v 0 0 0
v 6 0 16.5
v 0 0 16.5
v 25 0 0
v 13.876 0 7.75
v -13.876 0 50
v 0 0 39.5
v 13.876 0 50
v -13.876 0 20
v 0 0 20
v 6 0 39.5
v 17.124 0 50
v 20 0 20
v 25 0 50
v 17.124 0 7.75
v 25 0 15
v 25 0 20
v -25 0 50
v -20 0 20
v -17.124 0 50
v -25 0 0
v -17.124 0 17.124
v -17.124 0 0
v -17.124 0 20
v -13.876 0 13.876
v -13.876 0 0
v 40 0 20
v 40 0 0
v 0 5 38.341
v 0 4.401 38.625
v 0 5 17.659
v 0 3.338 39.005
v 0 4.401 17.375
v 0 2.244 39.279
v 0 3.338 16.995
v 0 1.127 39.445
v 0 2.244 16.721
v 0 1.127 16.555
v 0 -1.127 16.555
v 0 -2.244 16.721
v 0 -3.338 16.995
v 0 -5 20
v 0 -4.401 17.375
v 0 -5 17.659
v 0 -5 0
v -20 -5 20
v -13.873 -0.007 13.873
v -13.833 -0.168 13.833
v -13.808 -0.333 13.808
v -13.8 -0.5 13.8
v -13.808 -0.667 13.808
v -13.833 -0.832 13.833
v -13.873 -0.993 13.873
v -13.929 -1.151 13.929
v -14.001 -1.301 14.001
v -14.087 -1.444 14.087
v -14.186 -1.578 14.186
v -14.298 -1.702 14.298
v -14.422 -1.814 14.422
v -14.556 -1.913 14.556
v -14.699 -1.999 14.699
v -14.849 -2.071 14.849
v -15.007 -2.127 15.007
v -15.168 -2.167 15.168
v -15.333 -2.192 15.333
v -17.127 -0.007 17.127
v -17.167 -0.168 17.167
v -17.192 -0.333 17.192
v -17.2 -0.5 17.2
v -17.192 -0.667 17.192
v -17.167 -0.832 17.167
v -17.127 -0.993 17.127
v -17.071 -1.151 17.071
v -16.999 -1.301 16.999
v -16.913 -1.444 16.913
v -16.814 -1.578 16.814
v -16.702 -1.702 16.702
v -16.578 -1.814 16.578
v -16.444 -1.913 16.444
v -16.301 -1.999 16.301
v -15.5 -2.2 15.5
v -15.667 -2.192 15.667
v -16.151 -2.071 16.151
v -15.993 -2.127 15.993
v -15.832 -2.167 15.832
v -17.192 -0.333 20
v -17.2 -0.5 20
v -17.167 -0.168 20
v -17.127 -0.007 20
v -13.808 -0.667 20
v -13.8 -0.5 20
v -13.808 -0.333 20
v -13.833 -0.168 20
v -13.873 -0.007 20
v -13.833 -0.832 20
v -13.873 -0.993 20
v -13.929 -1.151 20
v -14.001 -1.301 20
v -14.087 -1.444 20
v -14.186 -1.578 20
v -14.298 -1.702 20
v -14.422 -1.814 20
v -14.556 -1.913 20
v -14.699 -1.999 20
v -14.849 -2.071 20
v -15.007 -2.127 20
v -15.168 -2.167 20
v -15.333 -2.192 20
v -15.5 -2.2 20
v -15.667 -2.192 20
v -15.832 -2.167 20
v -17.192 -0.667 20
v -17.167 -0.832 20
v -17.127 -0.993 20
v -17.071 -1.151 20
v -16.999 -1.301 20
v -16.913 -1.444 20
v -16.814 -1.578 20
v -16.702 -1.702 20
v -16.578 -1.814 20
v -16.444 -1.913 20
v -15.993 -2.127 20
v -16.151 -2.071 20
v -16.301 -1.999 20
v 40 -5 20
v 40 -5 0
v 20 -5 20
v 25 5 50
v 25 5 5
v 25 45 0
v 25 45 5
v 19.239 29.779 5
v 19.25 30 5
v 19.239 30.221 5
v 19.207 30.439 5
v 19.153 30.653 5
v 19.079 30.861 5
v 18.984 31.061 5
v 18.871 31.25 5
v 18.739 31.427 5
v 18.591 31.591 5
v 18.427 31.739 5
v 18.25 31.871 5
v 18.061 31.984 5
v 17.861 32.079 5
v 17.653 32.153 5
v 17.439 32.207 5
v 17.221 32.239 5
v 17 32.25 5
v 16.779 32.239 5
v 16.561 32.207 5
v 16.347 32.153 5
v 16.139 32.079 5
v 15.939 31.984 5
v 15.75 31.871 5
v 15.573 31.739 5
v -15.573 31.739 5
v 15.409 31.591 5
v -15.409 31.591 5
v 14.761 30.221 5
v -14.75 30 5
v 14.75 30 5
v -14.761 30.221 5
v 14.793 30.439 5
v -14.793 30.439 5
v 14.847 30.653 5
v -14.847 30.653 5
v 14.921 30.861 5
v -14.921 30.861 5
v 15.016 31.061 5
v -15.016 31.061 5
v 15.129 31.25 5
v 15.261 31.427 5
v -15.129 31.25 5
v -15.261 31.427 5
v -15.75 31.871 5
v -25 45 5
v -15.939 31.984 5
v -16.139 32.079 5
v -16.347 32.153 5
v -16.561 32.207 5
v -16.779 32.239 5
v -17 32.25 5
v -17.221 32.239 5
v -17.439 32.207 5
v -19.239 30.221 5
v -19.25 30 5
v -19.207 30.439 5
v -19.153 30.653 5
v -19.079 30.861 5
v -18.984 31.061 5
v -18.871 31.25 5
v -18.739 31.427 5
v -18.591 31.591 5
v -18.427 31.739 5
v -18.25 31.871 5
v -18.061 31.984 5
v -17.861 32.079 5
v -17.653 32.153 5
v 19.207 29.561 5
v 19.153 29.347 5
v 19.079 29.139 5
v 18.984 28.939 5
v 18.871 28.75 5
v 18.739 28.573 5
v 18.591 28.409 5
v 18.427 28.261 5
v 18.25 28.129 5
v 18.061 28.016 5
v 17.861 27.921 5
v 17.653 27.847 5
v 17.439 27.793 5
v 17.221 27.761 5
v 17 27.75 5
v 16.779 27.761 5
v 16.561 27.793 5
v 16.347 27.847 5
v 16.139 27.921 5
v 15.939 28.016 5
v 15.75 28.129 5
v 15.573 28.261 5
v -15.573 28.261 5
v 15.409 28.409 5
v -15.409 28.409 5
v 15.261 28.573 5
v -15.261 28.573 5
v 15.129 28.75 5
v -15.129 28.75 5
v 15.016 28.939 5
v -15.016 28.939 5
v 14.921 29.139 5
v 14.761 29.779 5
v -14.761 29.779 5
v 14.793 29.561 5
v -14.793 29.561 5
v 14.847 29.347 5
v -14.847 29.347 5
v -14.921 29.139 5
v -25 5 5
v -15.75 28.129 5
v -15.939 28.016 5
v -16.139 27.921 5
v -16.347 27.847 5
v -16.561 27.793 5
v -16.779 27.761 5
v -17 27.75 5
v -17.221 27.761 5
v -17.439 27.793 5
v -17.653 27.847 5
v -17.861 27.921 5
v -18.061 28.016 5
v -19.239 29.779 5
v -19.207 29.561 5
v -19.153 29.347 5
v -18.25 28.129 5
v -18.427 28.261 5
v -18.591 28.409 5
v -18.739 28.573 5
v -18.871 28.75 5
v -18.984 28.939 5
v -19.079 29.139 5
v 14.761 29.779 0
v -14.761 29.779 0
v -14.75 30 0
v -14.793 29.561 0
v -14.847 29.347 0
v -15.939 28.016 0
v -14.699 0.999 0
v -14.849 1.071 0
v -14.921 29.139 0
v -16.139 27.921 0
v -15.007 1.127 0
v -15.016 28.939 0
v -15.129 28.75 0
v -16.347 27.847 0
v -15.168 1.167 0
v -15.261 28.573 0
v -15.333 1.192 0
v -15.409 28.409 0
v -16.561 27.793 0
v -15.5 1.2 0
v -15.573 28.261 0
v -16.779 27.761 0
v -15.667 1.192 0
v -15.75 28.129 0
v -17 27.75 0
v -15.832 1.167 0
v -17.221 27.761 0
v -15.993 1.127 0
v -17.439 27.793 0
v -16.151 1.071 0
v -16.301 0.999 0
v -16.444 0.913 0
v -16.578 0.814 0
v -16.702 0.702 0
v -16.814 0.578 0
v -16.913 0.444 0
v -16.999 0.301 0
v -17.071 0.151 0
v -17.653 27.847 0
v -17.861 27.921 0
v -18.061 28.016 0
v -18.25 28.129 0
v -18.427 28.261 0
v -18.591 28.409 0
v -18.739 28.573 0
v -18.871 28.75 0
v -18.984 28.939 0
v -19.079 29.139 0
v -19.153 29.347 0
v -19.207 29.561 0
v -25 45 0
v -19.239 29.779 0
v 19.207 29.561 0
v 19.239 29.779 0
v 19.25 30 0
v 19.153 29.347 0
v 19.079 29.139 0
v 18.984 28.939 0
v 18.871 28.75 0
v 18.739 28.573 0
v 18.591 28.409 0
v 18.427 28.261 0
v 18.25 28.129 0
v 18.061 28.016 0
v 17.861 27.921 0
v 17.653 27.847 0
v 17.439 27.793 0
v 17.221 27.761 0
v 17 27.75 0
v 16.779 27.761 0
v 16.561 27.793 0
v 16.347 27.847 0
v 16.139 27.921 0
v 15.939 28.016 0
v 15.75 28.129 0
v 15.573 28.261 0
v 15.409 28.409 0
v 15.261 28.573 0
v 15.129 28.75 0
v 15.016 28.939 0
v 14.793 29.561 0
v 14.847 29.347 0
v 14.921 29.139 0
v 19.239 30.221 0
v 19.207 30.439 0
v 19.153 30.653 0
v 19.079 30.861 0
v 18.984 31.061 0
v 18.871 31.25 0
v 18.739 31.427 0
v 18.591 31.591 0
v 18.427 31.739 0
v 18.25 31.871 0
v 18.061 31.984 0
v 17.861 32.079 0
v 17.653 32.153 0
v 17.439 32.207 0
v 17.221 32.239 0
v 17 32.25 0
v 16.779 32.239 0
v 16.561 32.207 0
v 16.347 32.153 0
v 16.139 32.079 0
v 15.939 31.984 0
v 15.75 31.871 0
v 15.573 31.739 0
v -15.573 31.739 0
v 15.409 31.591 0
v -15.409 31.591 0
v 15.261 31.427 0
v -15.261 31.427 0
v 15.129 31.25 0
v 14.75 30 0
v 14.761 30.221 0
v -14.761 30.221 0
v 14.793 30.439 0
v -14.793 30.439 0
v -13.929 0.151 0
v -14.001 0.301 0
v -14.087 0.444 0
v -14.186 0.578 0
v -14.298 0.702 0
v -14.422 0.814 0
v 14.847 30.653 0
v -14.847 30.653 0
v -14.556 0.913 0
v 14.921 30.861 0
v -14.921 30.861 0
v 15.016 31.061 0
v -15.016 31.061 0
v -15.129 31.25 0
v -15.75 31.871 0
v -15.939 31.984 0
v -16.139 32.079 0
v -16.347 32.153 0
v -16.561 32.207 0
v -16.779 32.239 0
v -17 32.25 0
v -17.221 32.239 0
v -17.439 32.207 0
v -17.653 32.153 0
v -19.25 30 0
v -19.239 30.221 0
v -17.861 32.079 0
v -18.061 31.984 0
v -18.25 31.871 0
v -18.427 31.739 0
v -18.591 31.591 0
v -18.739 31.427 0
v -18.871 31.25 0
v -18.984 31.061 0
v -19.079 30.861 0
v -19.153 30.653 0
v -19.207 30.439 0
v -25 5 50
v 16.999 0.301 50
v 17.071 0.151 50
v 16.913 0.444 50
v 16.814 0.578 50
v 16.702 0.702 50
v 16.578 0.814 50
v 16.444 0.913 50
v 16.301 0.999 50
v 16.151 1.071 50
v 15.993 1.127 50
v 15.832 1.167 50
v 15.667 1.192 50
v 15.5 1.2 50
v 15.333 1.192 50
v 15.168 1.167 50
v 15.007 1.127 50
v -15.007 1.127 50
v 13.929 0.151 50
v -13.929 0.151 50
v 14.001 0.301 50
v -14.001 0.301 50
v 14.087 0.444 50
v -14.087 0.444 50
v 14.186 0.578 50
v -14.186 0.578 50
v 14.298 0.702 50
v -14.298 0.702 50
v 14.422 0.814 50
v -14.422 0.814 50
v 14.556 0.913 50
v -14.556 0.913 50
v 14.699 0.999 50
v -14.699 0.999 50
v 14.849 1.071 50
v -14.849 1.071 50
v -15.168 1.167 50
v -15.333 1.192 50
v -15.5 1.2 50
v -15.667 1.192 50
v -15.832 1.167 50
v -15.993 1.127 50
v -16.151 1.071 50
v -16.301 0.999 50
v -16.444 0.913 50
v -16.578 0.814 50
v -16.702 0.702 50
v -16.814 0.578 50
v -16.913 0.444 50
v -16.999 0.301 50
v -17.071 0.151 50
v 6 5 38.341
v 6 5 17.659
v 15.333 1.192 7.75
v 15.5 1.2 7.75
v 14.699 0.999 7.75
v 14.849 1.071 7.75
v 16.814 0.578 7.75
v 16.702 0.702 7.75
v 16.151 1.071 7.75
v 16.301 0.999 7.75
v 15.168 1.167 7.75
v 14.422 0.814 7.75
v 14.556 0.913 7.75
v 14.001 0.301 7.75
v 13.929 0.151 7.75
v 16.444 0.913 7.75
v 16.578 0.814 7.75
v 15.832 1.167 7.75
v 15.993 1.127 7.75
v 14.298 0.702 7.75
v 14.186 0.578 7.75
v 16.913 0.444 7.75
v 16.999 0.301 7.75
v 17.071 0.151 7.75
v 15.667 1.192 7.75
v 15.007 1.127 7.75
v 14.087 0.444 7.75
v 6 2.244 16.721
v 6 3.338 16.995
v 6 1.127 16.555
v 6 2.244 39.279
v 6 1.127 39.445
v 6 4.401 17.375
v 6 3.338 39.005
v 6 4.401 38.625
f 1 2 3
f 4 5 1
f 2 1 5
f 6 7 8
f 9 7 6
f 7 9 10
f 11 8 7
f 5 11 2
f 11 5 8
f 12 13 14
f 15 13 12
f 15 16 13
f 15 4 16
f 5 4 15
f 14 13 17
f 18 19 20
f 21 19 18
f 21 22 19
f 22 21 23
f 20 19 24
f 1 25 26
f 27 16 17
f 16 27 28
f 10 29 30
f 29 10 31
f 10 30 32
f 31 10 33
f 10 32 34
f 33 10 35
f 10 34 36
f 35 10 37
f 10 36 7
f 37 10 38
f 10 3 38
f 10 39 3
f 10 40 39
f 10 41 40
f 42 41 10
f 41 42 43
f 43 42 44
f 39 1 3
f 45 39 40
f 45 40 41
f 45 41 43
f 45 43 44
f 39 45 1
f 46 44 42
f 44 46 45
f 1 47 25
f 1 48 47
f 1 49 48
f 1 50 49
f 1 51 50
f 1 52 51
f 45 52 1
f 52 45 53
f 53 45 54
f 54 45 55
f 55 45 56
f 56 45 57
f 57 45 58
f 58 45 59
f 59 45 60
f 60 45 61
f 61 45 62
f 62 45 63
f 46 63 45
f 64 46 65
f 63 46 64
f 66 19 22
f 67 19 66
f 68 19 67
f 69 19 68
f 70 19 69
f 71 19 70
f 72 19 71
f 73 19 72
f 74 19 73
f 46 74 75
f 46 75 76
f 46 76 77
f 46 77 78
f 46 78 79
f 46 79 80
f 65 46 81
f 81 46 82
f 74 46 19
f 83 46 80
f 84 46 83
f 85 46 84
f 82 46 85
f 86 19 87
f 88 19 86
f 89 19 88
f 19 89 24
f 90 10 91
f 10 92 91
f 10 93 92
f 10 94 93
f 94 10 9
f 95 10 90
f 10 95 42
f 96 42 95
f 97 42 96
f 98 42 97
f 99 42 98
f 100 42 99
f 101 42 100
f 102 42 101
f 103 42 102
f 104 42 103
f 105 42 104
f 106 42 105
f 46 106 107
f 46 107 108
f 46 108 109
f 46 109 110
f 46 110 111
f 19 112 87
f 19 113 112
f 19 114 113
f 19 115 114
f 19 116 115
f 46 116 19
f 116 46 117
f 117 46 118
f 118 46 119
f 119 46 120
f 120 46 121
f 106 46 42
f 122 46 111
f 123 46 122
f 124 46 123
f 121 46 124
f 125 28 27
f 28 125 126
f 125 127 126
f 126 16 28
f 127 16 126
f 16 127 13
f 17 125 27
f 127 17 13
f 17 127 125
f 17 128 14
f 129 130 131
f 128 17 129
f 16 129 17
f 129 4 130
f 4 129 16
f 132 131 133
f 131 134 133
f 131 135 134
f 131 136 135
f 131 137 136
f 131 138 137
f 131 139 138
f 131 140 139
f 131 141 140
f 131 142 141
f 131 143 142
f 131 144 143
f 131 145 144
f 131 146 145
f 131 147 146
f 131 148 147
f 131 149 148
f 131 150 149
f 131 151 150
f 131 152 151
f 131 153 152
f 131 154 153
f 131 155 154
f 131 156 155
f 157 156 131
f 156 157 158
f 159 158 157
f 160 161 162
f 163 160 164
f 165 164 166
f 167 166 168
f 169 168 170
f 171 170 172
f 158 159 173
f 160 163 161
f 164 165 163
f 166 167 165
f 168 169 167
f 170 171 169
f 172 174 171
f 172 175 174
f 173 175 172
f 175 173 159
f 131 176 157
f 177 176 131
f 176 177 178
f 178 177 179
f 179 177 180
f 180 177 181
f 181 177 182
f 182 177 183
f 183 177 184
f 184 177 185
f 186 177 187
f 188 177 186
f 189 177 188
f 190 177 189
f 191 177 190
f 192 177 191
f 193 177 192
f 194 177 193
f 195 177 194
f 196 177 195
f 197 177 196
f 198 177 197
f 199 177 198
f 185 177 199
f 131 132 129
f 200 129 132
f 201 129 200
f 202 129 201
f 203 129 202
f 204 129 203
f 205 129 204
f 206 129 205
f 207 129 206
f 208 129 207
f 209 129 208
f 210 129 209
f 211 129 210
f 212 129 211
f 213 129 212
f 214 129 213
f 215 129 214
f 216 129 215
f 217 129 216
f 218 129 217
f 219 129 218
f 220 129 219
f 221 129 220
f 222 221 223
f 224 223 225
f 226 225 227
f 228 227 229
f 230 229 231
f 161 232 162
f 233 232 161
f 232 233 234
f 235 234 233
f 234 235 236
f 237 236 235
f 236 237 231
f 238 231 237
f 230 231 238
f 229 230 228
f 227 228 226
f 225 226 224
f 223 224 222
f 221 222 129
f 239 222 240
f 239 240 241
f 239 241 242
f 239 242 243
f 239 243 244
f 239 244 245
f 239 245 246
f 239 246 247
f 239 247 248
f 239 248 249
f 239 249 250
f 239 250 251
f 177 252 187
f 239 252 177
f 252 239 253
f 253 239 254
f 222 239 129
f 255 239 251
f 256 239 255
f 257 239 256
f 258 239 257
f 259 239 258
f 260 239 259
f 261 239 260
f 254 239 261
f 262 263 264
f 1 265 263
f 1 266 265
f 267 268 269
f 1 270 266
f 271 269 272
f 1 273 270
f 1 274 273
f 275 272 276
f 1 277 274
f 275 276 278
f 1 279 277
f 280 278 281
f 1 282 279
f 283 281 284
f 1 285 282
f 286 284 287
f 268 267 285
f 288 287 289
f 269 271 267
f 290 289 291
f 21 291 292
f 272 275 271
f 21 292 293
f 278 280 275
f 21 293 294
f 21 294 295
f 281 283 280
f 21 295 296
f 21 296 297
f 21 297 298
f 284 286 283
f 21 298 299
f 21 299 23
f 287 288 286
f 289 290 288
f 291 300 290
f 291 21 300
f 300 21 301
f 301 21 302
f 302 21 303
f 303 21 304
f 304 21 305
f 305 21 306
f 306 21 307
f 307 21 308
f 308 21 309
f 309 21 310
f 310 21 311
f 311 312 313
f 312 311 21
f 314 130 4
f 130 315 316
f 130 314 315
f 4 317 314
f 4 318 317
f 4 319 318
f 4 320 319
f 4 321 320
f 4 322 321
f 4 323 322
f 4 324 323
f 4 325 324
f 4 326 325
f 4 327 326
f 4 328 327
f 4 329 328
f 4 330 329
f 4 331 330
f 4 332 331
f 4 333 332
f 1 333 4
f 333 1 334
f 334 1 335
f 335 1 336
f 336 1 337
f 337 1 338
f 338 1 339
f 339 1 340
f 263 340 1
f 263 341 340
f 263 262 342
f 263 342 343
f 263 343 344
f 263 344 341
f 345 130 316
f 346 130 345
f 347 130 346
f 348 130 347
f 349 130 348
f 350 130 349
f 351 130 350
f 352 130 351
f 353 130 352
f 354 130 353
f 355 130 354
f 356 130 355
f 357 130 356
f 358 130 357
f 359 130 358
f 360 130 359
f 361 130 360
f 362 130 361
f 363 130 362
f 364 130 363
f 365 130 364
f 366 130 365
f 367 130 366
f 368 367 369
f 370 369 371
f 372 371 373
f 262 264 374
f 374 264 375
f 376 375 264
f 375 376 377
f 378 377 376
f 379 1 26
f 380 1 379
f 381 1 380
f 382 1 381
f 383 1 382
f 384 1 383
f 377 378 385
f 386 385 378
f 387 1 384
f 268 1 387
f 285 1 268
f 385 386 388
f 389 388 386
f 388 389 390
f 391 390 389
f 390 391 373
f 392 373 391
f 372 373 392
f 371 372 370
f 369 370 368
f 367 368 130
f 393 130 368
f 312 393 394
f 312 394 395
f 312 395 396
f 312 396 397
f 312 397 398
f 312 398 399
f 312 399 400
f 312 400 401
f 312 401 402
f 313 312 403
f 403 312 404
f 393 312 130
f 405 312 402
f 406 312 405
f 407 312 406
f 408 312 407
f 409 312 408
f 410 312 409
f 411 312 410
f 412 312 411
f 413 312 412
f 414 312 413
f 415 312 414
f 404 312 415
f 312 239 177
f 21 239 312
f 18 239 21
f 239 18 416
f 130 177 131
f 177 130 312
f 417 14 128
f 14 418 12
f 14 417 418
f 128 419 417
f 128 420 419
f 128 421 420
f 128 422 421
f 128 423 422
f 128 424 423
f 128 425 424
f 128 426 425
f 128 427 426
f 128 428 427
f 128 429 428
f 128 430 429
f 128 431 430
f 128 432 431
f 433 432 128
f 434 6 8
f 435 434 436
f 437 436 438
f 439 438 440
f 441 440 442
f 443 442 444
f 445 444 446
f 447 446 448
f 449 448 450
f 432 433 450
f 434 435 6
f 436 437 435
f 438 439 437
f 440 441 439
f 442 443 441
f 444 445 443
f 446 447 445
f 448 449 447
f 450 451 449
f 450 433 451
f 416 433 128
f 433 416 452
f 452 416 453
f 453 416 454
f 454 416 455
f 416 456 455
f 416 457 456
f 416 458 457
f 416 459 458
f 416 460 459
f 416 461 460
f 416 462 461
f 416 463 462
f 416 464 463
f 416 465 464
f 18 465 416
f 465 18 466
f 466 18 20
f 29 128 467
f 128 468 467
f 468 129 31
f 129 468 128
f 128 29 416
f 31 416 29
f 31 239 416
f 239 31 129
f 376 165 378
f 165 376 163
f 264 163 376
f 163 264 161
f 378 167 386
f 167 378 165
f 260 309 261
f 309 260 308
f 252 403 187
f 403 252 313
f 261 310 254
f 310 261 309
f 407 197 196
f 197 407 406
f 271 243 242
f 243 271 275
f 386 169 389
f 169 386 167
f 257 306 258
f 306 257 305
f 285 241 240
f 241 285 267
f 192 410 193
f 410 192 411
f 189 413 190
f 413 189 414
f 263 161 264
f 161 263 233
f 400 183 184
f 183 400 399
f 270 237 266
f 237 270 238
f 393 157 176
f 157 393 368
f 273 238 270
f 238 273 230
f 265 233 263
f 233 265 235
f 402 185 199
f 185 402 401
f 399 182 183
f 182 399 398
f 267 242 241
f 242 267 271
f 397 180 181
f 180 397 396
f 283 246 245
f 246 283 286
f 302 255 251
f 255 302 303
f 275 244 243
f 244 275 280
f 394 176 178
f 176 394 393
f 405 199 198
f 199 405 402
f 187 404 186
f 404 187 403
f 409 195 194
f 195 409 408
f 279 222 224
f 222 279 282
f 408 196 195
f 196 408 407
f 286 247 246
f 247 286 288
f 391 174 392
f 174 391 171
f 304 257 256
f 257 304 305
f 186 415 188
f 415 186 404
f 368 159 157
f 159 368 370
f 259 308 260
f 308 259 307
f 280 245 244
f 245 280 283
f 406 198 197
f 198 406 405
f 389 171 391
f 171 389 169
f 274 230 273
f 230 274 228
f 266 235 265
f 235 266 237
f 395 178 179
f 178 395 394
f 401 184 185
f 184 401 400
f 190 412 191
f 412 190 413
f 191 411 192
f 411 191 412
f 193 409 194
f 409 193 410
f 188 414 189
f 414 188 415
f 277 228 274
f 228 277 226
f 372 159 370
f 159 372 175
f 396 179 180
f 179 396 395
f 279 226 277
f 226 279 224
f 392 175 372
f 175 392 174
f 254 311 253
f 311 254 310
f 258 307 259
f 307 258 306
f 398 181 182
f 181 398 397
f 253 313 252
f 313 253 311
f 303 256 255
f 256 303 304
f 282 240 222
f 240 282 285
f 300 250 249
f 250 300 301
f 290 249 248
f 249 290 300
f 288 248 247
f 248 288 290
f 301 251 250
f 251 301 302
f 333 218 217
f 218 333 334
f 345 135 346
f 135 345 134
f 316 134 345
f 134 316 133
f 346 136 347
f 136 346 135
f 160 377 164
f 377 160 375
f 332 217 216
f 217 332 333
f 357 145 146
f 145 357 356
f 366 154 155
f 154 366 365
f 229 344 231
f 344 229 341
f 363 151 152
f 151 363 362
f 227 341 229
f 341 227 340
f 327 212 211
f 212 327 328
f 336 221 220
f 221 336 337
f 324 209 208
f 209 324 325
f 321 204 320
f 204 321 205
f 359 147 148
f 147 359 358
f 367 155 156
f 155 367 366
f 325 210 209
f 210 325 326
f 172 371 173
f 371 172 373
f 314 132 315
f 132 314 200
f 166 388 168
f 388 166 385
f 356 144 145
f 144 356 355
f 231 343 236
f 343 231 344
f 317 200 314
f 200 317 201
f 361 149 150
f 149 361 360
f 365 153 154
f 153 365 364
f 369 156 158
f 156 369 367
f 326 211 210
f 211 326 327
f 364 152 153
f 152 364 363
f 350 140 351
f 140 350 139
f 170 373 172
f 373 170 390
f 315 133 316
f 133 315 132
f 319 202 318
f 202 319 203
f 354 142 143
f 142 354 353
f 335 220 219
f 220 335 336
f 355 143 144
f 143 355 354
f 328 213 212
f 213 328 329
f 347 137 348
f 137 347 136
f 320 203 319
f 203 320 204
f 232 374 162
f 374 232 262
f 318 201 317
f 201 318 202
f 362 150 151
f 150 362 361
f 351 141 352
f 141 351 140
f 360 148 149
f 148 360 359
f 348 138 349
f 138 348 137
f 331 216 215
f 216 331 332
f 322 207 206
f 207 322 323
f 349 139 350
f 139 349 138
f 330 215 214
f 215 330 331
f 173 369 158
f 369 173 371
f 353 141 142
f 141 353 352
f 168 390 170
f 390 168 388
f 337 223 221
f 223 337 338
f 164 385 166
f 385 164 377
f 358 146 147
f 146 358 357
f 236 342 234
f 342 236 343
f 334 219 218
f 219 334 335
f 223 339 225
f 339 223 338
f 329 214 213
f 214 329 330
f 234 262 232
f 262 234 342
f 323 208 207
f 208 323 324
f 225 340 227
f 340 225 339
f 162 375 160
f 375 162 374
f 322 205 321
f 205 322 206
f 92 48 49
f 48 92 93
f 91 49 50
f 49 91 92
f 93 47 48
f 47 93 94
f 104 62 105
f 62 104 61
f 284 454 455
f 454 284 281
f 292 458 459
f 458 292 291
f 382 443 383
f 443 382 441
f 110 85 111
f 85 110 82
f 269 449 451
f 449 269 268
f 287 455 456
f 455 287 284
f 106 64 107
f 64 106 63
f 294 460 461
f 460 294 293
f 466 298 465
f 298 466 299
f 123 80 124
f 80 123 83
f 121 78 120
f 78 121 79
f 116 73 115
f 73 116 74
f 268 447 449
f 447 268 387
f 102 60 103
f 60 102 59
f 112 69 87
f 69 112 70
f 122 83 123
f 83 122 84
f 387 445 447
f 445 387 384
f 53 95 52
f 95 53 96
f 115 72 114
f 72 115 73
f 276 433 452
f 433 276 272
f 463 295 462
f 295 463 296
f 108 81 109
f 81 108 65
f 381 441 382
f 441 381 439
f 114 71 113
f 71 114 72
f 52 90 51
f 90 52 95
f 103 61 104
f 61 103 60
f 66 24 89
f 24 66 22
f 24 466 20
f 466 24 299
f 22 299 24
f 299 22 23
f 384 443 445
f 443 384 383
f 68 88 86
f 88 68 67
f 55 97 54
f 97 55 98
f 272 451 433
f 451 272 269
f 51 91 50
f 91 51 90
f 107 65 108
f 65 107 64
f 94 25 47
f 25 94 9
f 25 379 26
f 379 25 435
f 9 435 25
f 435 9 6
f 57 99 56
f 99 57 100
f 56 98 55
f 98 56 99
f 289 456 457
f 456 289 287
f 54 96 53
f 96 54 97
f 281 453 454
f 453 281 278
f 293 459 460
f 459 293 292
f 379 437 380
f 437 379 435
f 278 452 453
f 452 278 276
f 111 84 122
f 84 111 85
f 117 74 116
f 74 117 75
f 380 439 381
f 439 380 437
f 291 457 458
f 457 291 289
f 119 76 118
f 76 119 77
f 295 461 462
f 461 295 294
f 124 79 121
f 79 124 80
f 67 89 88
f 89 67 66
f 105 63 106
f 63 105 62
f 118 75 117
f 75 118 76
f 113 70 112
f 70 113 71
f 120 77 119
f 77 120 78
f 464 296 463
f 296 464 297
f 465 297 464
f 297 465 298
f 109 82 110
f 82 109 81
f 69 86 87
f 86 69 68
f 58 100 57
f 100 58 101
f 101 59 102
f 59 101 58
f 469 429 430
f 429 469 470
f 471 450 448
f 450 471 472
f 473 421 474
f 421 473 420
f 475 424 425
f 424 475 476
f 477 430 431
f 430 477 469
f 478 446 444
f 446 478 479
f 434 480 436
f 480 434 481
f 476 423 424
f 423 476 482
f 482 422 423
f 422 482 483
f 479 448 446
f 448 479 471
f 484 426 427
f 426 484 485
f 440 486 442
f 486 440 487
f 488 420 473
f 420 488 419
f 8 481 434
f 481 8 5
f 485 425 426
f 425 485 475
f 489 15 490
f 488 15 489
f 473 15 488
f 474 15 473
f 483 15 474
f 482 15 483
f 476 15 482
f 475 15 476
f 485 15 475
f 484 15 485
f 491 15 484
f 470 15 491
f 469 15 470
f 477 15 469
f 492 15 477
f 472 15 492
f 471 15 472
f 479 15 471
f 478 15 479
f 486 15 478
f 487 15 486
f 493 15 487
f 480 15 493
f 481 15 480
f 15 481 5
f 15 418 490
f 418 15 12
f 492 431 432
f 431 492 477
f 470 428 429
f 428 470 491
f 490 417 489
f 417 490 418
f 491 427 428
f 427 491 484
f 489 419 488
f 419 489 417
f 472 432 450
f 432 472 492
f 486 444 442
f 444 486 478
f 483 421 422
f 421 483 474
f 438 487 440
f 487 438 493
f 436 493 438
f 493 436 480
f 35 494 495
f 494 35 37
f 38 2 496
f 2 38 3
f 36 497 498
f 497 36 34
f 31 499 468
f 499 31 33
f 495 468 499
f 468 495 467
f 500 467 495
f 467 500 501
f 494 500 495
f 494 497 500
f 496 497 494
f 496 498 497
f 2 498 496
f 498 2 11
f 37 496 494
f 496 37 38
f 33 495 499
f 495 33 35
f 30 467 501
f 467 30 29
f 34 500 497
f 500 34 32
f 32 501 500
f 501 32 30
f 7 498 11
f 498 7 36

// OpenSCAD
// L-shaped mounting bracket for NEMA 17 stepper motor (e.g. syringe pump)
// Print orientation: base plate on bed, motor plate builds upward (+Z)

$fn = 64;

// ---- Base plate ----
base_x0 = -25;      // plate x start
base_x1 = 25;       // plate x end
base_y0 = 0;        // plate y start
base_y1 = 45;       // plate y end
base_z1 = 5;        // plate z end (thickness)

// ---- Motor plate ----
motor_x0 = -25;     // plate x start
motor_x1 = 25;      // plate x end
motor_y0 = 0;       // plate y start
motor_y1 = 5;       // plate y end (thickness)
motor_z1 = 50;      // plate z end (height)

// ---- Mount holes ----
hole_d4 = 4.5;      // M4 through-hole diameter
hole_x4 = [-17, 17];// M4 hole x positions
hole_y4 = 30;       // M4 hole y position

// ---- Boss hole ----
boss_d  = 23;       // motor centring boss hole diameter
boss_x  = 0;        // boss hole x centre
boss_z  = 28;       // boss hole z centre

// ---- Screw holes ----
screw_d = 3.4;      // M3 screw hole diameter
screw_n = 4;        // number of screw holes
screw_a = 31;       // square pattern side length

// ---- Gussets ----
gusset_t = 5;       // gusset thickness (X)
gusset_l = 20;      // gusset leg lengths (Y and Z)

// ---- Misc ----
eps = 0.5;          // cutter overshoot past faces

difference() {
    union() {
        // Base plate
        translate([base_x0, base_y0, 0])
            cube([base_x1 - base_x0, base_y1 - base_y0, base_z1]);

        // Motor plate
        translate([motor_x0, motor_y0, 0])
            cube([motor_x1 - motor_x0, motor_y1 - motor_y0, motor_z1]);

        // Gussets, flush with left and right edges
        for (sx = [-1, 1])
            translate([sx * (25 - gusset_t), 0, 0])
                rotate([90, 0, 0])
                    linear_extrude(height = gusset_t)
                        polygon([[gusset_l, gusset_l], [0, gusset_l], [gusset_l, 0]]);
    }

    // Base plate M4 through-holes
    for (x = hole_x4)
        translate([x, hole_y4, -eps])
            cylinder(d = hole_d4, h = base_z1 + 2 * eps);

    // Motor plate boss hole (along Y)
    translate([boss_x, 0, boss_z])
        rotate([0, 90, 0])
            cylinder(d = boss_d, h = motor_y1 + 2 * eps);

    // M3 screw holes on square pattern
    for (i = [0 : screw_n - 1]) {
        x = (i % 2 - 0.5) * screw_a;
        z = (i / 2 - 0.25) * screw_a;
        translate([x, motor_y0 - eps, z])
            cylinder(d = screw_d, h = motor_z1 + 2 * eps);
    }
}
